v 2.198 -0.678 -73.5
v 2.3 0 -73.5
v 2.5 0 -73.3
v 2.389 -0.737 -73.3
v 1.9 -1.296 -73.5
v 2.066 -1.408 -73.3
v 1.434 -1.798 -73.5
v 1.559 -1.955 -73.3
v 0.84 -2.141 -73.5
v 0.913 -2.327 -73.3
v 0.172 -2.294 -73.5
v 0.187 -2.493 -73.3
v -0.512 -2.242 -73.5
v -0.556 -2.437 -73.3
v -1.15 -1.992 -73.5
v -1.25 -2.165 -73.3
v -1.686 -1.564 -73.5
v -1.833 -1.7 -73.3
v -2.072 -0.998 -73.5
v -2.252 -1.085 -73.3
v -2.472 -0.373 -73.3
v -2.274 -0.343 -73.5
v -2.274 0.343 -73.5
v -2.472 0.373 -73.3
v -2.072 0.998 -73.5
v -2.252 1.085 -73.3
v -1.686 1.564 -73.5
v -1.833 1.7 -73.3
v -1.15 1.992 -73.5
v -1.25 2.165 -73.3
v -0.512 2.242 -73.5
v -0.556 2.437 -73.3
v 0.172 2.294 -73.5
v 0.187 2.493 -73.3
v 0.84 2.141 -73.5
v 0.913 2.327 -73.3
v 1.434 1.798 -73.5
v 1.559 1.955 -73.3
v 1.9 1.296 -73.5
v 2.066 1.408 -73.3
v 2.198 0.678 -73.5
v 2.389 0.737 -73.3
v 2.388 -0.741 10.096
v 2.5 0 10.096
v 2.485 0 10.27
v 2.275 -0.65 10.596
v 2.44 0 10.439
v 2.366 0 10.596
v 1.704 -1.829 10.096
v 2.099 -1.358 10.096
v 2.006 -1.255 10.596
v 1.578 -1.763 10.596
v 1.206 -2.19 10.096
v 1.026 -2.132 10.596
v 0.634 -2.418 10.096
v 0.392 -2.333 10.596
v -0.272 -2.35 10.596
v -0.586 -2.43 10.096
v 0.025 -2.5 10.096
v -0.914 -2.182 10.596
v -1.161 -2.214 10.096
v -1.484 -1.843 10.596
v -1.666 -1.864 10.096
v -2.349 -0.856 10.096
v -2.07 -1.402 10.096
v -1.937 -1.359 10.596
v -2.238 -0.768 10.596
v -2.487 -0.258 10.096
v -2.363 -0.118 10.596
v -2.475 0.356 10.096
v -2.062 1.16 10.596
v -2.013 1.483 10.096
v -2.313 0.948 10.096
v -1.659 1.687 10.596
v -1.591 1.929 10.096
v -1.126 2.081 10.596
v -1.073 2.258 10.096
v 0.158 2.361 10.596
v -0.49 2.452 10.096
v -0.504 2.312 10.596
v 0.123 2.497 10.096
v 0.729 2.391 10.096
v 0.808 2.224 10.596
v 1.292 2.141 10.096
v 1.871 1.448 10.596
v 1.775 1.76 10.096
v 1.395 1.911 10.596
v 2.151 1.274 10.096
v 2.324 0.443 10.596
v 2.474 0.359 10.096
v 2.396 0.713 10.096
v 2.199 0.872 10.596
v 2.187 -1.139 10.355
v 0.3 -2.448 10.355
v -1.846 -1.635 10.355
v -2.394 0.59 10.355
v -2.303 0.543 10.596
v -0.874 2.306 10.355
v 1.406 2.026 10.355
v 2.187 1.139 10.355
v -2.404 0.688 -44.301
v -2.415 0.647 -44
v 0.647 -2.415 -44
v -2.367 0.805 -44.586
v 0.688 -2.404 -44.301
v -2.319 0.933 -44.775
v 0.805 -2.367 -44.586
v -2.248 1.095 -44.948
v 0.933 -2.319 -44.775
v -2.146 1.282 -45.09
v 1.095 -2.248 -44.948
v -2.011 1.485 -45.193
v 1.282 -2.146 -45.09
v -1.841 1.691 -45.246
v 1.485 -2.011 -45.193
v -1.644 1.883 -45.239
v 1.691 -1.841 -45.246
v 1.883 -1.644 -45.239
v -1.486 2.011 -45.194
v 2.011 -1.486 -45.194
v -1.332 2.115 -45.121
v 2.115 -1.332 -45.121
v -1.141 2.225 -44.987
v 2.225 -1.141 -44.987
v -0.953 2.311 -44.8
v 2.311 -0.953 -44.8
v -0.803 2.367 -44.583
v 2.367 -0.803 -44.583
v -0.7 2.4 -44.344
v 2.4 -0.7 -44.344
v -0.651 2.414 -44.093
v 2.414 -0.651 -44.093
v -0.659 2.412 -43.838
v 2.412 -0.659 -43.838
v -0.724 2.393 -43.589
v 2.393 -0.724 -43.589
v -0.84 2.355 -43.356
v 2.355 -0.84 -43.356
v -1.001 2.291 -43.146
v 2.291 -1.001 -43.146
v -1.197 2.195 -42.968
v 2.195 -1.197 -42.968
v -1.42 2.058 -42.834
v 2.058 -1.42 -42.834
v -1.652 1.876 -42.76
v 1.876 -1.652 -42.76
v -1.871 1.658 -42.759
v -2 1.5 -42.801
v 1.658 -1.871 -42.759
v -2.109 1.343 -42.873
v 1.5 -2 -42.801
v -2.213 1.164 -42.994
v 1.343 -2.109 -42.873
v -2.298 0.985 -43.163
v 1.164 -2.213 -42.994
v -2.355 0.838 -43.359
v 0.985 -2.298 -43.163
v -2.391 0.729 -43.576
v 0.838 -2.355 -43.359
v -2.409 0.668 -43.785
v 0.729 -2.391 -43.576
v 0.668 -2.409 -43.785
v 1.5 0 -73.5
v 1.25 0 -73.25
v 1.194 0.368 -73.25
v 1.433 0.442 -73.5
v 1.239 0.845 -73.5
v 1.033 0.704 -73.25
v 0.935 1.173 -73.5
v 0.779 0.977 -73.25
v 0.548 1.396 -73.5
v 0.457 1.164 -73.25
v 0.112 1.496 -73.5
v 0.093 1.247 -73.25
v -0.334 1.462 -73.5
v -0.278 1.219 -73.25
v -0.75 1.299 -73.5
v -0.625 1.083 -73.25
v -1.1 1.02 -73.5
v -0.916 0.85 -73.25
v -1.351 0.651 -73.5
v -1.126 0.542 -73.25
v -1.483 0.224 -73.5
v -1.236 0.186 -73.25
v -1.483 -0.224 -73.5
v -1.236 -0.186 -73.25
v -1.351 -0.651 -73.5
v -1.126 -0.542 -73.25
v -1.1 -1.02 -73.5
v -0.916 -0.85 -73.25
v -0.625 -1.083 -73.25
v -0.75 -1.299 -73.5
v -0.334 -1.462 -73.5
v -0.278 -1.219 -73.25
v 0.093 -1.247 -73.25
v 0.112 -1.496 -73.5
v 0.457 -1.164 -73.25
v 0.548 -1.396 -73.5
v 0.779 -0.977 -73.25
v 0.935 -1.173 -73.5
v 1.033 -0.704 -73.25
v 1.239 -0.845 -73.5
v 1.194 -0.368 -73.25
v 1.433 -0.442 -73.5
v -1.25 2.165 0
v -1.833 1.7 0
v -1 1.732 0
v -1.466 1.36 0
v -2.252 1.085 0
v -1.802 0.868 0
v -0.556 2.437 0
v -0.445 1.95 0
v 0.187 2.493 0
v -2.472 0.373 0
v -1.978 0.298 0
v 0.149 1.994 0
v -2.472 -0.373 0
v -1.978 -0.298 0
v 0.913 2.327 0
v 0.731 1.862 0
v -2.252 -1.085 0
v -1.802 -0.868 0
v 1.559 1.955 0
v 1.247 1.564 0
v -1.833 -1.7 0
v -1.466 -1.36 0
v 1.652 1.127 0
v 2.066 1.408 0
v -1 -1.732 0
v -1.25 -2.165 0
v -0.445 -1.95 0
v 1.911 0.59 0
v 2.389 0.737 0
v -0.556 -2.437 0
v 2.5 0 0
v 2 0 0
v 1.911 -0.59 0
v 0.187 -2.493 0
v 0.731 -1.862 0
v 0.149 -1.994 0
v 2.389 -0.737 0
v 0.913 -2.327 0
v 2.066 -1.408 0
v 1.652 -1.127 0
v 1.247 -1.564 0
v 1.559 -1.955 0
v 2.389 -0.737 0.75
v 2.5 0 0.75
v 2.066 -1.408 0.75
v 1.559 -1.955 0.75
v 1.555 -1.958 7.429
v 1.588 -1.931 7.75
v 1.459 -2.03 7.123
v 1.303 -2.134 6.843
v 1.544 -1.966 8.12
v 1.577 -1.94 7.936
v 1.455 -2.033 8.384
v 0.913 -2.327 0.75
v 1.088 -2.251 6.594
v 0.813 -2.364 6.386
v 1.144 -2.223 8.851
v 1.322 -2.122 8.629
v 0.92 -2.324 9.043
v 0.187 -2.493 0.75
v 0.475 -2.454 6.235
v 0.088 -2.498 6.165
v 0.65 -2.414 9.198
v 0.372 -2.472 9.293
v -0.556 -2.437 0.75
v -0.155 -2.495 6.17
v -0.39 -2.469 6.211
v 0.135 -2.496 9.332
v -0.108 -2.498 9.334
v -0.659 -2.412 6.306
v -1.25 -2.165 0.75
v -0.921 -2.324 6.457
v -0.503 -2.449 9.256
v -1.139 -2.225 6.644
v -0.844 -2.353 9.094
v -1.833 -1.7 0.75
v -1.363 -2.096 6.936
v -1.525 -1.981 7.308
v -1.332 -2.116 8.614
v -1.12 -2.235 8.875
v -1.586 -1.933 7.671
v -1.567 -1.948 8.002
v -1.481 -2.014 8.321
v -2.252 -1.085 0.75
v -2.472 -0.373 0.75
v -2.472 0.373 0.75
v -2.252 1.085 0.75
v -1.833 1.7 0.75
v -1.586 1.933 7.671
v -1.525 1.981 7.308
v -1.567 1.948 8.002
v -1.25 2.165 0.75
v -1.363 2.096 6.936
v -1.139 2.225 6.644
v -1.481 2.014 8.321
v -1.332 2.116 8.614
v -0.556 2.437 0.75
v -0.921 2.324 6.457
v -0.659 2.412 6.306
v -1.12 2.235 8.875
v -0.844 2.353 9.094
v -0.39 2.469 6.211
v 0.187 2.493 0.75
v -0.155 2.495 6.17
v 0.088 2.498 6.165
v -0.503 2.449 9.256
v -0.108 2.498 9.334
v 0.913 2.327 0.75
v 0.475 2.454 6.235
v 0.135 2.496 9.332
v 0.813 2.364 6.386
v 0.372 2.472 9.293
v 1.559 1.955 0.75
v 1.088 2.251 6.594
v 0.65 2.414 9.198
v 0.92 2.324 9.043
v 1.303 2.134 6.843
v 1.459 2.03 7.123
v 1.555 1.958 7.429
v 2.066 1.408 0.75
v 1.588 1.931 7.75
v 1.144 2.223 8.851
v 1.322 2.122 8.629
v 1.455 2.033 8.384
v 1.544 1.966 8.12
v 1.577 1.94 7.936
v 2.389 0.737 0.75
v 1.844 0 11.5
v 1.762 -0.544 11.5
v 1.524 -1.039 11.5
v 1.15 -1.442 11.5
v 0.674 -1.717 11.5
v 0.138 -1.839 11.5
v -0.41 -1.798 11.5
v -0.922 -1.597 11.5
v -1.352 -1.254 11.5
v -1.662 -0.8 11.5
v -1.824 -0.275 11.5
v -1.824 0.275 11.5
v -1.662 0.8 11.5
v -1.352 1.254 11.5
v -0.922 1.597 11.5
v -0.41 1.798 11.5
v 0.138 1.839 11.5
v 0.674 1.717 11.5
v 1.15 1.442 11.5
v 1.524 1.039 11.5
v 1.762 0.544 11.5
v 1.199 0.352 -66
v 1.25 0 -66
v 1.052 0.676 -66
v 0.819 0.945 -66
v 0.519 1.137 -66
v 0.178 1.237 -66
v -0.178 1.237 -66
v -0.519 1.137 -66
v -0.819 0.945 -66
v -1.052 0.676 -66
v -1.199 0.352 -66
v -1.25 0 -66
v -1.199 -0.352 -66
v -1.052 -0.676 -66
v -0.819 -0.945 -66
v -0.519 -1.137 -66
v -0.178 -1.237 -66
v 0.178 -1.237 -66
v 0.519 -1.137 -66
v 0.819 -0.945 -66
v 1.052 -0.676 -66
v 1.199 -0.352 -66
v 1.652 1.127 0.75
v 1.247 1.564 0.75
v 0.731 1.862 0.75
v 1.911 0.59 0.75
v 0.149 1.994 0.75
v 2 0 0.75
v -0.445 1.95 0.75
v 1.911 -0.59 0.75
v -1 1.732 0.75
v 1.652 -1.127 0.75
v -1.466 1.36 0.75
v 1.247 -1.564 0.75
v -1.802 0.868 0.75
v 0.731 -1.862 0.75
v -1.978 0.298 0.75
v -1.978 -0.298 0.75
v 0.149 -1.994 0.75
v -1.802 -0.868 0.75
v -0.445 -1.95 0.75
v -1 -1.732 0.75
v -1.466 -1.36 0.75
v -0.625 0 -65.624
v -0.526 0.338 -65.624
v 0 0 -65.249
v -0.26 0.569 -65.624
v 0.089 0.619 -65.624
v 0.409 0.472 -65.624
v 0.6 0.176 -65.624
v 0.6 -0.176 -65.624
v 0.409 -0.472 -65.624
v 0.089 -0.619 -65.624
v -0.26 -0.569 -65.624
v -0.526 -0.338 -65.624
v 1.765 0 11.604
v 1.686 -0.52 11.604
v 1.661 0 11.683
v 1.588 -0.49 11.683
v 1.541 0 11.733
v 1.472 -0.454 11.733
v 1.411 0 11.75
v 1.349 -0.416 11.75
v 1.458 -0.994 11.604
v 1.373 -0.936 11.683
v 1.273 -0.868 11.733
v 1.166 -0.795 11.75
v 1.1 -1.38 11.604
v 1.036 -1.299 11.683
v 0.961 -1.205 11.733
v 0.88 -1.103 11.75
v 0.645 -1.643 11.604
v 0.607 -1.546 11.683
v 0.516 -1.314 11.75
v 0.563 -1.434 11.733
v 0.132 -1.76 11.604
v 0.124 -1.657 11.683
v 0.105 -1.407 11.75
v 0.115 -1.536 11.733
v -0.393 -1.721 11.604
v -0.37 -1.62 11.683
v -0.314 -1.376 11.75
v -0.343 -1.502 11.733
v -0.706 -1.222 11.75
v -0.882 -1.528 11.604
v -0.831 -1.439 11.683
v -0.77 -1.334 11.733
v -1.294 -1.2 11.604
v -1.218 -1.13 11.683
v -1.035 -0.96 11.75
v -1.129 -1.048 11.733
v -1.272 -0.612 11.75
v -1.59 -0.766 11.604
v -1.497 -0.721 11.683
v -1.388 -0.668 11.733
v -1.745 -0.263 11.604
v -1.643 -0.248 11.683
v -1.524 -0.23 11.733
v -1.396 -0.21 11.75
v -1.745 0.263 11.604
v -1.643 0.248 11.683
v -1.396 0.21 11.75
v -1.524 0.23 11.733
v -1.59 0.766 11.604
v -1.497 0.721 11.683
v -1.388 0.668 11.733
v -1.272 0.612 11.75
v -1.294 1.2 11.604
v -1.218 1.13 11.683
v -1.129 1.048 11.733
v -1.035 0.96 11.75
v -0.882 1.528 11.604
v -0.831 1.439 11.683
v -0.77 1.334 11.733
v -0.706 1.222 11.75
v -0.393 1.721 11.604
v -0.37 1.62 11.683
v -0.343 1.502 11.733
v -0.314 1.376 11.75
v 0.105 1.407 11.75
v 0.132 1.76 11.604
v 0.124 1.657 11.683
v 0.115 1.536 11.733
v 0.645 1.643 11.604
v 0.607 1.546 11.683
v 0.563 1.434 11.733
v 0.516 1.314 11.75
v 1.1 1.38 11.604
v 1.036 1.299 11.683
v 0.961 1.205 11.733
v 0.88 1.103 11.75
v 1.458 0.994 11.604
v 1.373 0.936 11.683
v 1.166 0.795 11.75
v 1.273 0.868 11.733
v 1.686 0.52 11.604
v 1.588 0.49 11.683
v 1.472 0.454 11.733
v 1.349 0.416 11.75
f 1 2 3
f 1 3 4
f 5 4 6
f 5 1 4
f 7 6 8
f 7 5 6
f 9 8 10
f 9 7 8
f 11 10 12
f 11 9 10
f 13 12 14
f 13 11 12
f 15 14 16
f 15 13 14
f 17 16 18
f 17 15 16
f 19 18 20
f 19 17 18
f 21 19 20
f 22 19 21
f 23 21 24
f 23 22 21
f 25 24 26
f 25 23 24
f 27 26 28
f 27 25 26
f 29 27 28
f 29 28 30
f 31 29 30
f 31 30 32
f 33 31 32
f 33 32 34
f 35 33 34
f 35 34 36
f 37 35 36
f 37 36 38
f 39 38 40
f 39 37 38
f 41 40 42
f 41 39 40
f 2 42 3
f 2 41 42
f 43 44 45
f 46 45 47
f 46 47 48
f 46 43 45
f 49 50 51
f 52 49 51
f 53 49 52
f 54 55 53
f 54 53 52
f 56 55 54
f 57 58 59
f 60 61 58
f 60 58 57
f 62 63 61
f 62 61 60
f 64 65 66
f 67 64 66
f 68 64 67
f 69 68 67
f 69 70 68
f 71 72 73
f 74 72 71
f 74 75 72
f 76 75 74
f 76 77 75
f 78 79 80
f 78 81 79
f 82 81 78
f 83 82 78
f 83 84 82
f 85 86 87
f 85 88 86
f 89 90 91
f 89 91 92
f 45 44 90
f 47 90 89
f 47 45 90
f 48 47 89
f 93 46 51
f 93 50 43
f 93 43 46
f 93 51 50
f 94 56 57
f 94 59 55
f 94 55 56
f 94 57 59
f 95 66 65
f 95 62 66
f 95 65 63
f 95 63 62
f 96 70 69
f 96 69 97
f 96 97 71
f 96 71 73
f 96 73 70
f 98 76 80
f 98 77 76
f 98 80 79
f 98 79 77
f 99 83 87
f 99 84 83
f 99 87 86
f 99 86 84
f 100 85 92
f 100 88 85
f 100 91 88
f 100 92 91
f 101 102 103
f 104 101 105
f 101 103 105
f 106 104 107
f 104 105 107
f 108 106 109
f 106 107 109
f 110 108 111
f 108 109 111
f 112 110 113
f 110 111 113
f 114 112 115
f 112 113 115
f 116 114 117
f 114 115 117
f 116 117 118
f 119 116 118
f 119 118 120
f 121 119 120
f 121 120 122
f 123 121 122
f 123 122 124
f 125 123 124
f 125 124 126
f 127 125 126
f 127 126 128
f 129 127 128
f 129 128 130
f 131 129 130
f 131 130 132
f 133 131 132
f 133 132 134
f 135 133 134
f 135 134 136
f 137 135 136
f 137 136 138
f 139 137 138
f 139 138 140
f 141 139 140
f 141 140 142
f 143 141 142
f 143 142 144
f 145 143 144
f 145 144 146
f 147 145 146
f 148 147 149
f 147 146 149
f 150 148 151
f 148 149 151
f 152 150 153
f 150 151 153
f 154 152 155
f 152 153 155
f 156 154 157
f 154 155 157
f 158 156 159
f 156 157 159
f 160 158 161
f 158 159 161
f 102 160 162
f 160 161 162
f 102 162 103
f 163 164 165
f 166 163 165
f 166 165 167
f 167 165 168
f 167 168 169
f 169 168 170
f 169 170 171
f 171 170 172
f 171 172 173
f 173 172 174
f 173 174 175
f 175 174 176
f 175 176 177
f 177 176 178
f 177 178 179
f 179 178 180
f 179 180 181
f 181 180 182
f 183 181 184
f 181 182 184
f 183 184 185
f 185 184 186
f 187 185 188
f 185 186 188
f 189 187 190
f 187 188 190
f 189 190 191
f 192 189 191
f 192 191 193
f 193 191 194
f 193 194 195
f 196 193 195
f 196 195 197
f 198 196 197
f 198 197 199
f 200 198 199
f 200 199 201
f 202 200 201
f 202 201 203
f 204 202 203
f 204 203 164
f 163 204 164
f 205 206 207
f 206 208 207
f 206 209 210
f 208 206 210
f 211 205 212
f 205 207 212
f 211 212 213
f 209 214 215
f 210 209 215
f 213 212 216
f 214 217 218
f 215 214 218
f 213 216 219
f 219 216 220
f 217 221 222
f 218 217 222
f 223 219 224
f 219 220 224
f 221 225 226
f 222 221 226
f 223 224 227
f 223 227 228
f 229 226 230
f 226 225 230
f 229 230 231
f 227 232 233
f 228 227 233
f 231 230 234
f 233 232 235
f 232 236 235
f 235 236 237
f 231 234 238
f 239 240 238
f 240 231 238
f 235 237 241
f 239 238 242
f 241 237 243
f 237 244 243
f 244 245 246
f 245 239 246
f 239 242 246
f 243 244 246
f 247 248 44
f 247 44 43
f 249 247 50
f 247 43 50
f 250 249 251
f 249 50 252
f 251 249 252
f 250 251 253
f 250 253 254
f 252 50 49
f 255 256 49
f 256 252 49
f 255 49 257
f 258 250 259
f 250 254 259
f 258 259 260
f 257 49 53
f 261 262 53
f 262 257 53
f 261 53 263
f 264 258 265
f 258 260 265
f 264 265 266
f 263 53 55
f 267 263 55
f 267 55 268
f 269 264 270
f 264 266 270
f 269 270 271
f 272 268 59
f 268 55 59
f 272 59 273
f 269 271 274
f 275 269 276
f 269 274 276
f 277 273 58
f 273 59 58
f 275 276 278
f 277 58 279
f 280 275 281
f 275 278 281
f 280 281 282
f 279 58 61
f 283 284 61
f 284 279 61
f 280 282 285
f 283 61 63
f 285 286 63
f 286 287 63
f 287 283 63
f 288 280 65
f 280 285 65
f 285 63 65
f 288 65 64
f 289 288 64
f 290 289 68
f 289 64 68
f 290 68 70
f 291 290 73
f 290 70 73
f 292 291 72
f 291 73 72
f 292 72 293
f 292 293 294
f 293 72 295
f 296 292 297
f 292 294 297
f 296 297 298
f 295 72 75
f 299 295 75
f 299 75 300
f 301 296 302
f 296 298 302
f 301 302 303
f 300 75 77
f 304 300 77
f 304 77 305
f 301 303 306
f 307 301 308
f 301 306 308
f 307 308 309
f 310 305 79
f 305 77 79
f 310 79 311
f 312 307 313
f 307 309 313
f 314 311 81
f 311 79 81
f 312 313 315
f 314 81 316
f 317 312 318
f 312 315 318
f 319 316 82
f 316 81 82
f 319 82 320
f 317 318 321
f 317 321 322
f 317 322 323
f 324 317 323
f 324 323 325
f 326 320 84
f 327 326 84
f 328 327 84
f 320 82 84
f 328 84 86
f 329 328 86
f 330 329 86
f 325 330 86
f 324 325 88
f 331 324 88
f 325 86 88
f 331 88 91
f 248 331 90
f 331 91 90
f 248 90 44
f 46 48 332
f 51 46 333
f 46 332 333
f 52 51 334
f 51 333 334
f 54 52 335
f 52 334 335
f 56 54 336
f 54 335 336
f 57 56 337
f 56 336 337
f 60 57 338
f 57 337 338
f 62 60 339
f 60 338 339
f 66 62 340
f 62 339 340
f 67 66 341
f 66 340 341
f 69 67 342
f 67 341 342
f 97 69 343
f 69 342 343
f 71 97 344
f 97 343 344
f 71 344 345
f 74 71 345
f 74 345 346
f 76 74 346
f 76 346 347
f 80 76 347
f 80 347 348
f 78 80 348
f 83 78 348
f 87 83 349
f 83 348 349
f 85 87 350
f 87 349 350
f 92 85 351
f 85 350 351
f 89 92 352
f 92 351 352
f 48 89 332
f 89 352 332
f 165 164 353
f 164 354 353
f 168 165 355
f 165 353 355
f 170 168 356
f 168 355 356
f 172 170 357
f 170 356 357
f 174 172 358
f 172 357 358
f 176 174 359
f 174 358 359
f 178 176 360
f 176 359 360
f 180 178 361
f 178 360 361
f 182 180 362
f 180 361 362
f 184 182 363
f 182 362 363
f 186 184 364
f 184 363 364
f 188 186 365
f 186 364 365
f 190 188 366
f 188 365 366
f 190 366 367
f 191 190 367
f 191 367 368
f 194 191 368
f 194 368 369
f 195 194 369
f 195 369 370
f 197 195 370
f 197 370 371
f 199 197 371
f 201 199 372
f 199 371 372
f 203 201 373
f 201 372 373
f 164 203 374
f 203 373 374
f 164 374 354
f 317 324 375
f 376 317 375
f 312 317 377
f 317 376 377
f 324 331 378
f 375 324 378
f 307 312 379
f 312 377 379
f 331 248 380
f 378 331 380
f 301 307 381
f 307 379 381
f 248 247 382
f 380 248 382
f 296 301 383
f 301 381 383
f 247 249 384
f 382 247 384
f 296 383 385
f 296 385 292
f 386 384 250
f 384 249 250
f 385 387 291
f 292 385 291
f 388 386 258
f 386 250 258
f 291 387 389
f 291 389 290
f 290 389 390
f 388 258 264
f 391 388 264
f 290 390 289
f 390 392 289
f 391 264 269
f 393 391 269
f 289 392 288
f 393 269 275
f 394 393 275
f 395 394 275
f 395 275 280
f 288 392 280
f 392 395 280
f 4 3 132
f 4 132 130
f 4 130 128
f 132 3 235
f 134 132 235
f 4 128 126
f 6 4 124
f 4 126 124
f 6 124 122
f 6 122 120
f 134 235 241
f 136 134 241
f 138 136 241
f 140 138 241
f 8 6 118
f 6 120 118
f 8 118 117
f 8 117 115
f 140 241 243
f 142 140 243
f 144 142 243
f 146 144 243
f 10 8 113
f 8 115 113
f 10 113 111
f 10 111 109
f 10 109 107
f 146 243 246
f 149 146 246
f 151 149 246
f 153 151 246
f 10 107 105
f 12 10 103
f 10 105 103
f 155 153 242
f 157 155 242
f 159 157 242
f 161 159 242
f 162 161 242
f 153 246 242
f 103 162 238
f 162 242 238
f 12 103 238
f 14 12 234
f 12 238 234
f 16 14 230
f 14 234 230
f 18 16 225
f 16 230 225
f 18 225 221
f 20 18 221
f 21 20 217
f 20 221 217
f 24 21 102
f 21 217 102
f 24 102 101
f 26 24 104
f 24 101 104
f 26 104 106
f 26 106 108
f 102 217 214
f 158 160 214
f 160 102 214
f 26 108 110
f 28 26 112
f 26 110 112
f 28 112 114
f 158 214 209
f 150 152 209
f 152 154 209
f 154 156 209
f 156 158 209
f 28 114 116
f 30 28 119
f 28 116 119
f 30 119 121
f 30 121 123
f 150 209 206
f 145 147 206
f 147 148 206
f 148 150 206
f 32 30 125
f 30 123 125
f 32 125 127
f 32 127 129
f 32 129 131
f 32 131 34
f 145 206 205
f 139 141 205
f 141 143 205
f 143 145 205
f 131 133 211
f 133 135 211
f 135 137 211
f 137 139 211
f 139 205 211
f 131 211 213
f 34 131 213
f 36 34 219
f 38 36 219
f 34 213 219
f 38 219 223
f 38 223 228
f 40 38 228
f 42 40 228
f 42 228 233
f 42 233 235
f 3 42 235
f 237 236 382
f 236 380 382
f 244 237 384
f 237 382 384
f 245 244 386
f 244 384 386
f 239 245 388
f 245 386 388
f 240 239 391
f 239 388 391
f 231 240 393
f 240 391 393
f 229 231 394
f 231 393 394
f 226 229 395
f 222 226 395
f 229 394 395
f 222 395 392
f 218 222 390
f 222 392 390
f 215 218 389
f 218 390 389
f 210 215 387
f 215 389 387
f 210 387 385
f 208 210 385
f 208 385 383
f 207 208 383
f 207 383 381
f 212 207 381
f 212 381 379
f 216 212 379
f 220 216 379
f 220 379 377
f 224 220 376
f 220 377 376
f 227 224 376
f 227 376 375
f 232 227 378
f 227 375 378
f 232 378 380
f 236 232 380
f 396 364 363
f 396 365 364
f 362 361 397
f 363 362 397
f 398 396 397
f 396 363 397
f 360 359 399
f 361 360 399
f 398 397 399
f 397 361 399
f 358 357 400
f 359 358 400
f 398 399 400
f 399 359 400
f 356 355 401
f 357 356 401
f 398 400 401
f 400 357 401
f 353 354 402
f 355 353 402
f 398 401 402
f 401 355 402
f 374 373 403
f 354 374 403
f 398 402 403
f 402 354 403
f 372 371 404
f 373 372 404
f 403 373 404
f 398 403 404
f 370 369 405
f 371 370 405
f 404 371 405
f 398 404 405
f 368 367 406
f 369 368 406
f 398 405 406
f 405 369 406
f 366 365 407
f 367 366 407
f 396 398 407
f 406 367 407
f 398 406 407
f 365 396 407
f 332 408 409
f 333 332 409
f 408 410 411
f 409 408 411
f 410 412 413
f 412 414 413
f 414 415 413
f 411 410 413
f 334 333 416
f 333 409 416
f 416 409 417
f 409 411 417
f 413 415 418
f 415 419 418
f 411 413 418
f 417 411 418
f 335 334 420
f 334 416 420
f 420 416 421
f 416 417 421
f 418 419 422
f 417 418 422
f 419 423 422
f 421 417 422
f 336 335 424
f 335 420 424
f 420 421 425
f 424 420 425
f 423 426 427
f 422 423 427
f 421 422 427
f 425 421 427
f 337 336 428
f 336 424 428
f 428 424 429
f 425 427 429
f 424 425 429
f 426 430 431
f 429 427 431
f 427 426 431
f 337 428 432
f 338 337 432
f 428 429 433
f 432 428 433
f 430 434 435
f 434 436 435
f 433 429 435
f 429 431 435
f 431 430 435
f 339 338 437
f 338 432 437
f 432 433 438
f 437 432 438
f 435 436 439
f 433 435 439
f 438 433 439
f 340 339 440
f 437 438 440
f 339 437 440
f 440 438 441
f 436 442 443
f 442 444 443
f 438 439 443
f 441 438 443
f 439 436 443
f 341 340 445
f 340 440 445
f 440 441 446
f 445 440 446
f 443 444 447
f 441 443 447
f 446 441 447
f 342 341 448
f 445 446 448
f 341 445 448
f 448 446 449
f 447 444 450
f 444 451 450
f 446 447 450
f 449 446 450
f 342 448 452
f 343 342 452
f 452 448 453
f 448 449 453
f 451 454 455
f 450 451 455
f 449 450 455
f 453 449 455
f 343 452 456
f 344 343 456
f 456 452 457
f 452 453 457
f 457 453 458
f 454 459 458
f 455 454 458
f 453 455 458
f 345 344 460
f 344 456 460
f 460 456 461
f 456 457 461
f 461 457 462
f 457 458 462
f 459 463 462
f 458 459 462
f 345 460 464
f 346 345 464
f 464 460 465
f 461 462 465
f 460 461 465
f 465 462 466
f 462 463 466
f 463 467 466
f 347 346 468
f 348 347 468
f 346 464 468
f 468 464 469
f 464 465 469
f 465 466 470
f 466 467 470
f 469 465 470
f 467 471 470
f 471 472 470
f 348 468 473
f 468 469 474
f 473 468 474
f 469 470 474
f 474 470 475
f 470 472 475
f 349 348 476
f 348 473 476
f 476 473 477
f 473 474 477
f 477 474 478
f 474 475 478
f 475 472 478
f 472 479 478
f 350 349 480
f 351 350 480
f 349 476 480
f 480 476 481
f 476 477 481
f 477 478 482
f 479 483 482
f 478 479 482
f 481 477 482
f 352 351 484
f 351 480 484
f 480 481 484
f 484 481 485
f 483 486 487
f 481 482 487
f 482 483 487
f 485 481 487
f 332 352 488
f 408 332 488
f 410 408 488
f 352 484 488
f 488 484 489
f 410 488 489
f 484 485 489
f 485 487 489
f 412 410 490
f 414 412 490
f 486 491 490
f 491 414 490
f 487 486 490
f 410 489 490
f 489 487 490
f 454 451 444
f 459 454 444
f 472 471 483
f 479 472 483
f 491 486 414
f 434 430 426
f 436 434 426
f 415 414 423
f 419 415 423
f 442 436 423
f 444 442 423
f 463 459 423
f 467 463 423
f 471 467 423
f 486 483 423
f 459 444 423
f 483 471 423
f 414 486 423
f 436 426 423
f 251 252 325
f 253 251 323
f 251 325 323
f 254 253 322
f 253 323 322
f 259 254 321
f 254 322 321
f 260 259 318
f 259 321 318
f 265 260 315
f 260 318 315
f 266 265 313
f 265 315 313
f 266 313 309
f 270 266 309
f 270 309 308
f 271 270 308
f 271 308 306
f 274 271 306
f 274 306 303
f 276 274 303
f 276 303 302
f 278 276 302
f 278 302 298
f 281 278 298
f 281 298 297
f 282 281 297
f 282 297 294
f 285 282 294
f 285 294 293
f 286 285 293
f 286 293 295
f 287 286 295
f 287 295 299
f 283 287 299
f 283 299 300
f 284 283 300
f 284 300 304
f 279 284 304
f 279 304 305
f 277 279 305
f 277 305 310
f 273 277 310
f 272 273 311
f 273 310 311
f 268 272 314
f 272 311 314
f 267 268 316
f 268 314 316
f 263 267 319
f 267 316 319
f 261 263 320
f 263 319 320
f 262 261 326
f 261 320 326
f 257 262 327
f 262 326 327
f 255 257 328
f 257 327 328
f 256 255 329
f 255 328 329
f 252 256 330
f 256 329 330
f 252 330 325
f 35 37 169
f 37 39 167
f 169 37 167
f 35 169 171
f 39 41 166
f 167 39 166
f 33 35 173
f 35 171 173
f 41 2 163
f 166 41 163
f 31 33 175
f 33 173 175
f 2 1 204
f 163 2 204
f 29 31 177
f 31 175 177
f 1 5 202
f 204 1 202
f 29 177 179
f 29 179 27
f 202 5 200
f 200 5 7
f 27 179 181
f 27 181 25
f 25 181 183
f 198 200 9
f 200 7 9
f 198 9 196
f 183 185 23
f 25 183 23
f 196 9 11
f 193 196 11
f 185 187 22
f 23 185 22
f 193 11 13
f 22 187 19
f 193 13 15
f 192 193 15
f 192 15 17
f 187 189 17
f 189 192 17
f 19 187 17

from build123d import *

# Parameters (mm, degrees)
F_1_8_0_125_CLEARANCE_DOWEL_HOLE1_D = 3.175
M3X0_5_TAPPED_HOLE2_D               = 2.5
M3X0_5_TAPPED_HOLE3_D               = 2.5
M3X0_5_TAPPED_HOLE3_DEPTH           = 7.5
M3X0_5_TAPPED_HOLE3_CSINK_D         = 3
M3X0_5_TAPPED_HOLE3_CSINK_ANGLE     = 90
M3X0_5_TAPPED_HOLE3_TIP             = 0.751075774
CHAMFER1_SIZE                       = 0.2
FILLET1_R                           = 1
FILLET2_R                           = 0.5


with BuildPart() as part:
    # Sketch1 → Revolve1 (revolve)
    with BuildSketch(Plane.XZ):
        Polygon((1.7, 11.75), (0, 11.75), (0, -73.5), (2.5, -73.5), (2.5, 0), (2, 0), (2, 0.75), (2.5, 0.75), (2.5, 10.364359355), align=None)
    revolve(axis=Axis((0, 0, 11.75), (0, 0, -1)))

    # 1/8 (0.125) Clearance Dowel Hole1 (through all)
    with Locations(Plane(origin=(0, -2.5, 7.75), x_dir=(-1, 0, 0), z_dir=(0, -1, 0))):
        with Locations((0, 0)):
            Hole(F_1_8_0_125_CLEARANCE_DOWEL_HOLE1_D / 2)

    # M3x0.5 Tapped Hole2 (through all)
    with Locations(Plane(origin=(-1.767766953, 1.767766953, -44), x_dir=(0.707106781, 0.707106781, 0), z_dir=(-0.707106781, 0.707106781, 0))):
        with Locations((0, 0)):
            Hole(M3X0_5_TAPPED_HOLE2_D / 2)

    # M3x0.5 Tapped Hole3
    with Locations(Plane(origin=(0, 0, -73.5), x_dir=(-1, 0, 0), z_dir=(0, 0, -1))):
        with Locations((0, 0)):
            CounterSinkHole(M3X0_5_TAPPED_HOLE3_D / 2, M3X0_5_TAPPED_HOLE3_CSINK_D / 2, depth=M3X0_5_TAPPED_HOLE3_DEPTH, counter_sink_angle=M3X0_5_TAPPED_HOLE3_CSINK_ANGLE)
            with Locations((0, 0, -(M3X0_5_TAPPED_HOLE3_DEPTH + M3X0_5_TAPPED_HOLE3_TIP / 2))):  # 118° drill point
                Cone(0, M3X0_5_TAPPED_HOLE3_D / 2, M3X0_5_TAPPED_HOLE3_TIP, mode=Mode.SUBTRACT)

    # Chamfer1
    chamfer1_edges = [part.edges().sort_by_distance(p)[0] for p in [
        (-2.5, 0, -73.5),
    ]]
    chamfer(chamfer1_edges, length=CHAMFER1_SIZE)

    # Fillet1
    fillet1_edges = [part.edges().sort_by_distance(p)[0] for p in [
        (-2.5, 0, 10.364359355),
    ]]
    fillet(fillet1_edges, radius=FILLET1_R)

    # Fillet2
    fillet2_edges = [part.edges().sort_by_distance(p)[0] for p in [
        (-1.7, 0, 11.75),
    ]]
    fillet(fillet2_edges, radius=FILLET2_R)


solid = part.part
